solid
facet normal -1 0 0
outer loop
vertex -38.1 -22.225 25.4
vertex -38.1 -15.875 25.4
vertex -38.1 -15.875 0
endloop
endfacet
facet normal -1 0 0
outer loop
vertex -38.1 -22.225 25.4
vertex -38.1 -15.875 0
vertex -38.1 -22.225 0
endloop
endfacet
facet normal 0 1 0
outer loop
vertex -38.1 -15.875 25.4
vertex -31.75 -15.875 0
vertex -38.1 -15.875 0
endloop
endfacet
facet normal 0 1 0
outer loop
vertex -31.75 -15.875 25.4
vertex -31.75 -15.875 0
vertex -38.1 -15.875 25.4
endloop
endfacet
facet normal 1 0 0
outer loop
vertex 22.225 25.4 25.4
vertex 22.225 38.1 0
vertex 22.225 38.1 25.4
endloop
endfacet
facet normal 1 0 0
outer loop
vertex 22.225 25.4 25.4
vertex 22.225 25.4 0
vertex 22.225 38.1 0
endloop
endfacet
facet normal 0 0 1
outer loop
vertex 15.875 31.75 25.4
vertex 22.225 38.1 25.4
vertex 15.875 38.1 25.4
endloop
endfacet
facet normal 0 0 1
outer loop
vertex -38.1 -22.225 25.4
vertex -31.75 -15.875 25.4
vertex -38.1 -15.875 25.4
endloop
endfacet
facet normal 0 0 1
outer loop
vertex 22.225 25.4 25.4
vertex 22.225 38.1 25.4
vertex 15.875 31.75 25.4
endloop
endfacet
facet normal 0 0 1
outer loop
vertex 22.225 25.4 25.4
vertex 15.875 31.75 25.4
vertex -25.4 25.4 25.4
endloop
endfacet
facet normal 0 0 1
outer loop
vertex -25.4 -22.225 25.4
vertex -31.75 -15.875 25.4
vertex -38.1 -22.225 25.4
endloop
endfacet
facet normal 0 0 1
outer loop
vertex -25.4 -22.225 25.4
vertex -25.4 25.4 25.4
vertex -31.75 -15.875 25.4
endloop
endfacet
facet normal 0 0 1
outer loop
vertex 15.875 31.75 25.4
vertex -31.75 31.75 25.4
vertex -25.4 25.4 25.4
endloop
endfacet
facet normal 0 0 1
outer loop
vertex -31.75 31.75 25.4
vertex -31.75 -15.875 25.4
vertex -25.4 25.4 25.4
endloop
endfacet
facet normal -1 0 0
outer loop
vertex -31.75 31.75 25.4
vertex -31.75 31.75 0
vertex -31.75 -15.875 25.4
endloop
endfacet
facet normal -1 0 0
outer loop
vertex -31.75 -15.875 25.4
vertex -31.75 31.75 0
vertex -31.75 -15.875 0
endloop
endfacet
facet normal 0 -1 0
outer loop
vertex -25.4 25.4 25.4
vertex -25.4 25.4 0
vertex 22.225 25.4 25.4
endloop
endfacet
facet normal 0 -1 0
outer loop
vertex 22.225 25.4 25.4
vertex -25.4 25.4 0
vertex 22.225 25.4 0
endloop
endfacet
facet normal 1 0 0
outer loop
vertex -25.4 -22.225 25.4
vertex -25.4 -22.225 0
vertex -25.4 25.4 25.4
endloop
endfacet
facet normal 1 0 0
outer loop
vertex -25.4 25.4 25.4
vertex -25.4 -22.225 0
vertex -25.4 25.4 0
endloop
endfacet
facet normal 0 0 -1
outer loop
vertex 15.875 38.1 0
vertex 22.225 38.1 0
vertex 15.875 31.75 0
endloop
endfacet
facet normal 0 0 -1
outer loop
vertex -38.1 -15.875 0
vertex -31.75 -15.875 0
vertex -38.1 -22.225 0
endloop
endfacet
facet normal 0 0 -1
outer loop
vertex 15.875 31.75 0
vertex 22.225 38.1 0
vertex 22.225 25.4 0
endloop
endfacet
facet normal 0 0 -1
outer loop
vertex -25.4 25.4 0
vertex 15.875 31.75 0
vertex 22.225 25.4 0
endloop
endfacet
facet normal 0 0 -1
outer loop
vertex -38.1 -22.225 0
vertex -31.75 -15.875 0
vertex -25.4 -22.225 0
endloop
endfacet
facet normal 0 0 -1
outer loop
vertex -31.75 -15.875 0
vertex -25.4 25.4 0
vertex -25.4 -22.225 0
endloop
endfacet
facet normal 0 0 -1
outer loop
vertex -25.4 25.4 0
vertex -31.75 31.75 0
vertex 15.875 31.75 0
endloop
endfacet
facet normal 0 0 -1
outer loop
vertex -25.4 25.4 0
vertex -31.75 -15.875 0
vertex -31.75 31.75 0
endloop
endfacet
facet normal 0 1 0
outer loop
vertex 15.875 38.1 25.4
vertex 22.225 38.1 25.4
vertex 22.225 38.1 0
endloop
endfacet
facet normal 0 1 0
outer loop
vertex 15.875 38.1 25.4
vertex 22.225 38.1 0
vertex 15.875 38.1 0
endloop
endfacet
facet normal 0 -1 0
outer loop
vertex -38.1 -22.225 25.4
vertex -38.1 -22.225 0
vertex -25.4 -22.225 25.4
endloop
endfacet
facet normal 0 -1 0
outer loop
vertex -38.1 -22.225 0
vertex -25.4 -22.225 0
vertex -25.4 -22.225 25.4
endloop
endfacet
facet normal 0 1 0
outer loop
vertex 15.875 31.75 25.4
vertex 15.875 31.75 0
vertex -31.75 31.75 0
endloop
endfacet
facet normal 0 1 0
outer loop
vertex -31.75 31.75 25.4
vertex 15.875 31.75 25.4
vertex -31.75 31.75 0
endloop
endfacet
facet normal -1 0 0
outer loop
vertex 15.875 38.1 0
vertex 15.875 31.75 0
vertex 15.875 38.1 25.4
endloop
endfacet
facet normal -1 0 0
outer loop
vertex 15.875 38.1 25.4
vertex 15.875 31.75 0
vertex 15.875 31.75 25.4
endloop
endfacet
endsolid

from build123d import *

# Parameters (mm, degrees)
F1_DEPTH = 25.4
F3_W     = 6.35
F3_H     = 25.4
F4_DEPTH = 6.35
F2_W     = 6.35
F2_H     = 25.4
F5_DEPTH = 6.35


with BuildPart() as f1:
    # F0 (on Top) → F1 (new body)
    with BuildSketch(Plane.XY):
        Polygon((-31.75, -22.225), (-25.4, -22.225), (-25.4, 25.4), (22.225, 25.4), (22.225, 31.75), (-31.75, 31.75), align=None)
    extrude(amount=F1_DEPTH)

    # F3 (on face) → F4 (join)
    with BuildSketch(Plane(origin=(0, 31.75, 0), x_dir=(-1, 0, 0), z_dir=(0, 1, 0))):
        with Locations((-19.05, 12.7)):
            Rectangle(F3_W, F3_H)
    extrude(amount=F4_DEPTH)

    # F2 (on face) → F5 (join)
    with BuildSketch(Plane(origin=(-31.75, 0, 0), x_dir=(0, -1, 0), z_dir=(-1, 0, 0))):
        with Locations((19.05, 12.7)):
            Rectangle(F2_W, F2_H)
    extrude(amount=F5_DEPTH)


solid = f1.part
